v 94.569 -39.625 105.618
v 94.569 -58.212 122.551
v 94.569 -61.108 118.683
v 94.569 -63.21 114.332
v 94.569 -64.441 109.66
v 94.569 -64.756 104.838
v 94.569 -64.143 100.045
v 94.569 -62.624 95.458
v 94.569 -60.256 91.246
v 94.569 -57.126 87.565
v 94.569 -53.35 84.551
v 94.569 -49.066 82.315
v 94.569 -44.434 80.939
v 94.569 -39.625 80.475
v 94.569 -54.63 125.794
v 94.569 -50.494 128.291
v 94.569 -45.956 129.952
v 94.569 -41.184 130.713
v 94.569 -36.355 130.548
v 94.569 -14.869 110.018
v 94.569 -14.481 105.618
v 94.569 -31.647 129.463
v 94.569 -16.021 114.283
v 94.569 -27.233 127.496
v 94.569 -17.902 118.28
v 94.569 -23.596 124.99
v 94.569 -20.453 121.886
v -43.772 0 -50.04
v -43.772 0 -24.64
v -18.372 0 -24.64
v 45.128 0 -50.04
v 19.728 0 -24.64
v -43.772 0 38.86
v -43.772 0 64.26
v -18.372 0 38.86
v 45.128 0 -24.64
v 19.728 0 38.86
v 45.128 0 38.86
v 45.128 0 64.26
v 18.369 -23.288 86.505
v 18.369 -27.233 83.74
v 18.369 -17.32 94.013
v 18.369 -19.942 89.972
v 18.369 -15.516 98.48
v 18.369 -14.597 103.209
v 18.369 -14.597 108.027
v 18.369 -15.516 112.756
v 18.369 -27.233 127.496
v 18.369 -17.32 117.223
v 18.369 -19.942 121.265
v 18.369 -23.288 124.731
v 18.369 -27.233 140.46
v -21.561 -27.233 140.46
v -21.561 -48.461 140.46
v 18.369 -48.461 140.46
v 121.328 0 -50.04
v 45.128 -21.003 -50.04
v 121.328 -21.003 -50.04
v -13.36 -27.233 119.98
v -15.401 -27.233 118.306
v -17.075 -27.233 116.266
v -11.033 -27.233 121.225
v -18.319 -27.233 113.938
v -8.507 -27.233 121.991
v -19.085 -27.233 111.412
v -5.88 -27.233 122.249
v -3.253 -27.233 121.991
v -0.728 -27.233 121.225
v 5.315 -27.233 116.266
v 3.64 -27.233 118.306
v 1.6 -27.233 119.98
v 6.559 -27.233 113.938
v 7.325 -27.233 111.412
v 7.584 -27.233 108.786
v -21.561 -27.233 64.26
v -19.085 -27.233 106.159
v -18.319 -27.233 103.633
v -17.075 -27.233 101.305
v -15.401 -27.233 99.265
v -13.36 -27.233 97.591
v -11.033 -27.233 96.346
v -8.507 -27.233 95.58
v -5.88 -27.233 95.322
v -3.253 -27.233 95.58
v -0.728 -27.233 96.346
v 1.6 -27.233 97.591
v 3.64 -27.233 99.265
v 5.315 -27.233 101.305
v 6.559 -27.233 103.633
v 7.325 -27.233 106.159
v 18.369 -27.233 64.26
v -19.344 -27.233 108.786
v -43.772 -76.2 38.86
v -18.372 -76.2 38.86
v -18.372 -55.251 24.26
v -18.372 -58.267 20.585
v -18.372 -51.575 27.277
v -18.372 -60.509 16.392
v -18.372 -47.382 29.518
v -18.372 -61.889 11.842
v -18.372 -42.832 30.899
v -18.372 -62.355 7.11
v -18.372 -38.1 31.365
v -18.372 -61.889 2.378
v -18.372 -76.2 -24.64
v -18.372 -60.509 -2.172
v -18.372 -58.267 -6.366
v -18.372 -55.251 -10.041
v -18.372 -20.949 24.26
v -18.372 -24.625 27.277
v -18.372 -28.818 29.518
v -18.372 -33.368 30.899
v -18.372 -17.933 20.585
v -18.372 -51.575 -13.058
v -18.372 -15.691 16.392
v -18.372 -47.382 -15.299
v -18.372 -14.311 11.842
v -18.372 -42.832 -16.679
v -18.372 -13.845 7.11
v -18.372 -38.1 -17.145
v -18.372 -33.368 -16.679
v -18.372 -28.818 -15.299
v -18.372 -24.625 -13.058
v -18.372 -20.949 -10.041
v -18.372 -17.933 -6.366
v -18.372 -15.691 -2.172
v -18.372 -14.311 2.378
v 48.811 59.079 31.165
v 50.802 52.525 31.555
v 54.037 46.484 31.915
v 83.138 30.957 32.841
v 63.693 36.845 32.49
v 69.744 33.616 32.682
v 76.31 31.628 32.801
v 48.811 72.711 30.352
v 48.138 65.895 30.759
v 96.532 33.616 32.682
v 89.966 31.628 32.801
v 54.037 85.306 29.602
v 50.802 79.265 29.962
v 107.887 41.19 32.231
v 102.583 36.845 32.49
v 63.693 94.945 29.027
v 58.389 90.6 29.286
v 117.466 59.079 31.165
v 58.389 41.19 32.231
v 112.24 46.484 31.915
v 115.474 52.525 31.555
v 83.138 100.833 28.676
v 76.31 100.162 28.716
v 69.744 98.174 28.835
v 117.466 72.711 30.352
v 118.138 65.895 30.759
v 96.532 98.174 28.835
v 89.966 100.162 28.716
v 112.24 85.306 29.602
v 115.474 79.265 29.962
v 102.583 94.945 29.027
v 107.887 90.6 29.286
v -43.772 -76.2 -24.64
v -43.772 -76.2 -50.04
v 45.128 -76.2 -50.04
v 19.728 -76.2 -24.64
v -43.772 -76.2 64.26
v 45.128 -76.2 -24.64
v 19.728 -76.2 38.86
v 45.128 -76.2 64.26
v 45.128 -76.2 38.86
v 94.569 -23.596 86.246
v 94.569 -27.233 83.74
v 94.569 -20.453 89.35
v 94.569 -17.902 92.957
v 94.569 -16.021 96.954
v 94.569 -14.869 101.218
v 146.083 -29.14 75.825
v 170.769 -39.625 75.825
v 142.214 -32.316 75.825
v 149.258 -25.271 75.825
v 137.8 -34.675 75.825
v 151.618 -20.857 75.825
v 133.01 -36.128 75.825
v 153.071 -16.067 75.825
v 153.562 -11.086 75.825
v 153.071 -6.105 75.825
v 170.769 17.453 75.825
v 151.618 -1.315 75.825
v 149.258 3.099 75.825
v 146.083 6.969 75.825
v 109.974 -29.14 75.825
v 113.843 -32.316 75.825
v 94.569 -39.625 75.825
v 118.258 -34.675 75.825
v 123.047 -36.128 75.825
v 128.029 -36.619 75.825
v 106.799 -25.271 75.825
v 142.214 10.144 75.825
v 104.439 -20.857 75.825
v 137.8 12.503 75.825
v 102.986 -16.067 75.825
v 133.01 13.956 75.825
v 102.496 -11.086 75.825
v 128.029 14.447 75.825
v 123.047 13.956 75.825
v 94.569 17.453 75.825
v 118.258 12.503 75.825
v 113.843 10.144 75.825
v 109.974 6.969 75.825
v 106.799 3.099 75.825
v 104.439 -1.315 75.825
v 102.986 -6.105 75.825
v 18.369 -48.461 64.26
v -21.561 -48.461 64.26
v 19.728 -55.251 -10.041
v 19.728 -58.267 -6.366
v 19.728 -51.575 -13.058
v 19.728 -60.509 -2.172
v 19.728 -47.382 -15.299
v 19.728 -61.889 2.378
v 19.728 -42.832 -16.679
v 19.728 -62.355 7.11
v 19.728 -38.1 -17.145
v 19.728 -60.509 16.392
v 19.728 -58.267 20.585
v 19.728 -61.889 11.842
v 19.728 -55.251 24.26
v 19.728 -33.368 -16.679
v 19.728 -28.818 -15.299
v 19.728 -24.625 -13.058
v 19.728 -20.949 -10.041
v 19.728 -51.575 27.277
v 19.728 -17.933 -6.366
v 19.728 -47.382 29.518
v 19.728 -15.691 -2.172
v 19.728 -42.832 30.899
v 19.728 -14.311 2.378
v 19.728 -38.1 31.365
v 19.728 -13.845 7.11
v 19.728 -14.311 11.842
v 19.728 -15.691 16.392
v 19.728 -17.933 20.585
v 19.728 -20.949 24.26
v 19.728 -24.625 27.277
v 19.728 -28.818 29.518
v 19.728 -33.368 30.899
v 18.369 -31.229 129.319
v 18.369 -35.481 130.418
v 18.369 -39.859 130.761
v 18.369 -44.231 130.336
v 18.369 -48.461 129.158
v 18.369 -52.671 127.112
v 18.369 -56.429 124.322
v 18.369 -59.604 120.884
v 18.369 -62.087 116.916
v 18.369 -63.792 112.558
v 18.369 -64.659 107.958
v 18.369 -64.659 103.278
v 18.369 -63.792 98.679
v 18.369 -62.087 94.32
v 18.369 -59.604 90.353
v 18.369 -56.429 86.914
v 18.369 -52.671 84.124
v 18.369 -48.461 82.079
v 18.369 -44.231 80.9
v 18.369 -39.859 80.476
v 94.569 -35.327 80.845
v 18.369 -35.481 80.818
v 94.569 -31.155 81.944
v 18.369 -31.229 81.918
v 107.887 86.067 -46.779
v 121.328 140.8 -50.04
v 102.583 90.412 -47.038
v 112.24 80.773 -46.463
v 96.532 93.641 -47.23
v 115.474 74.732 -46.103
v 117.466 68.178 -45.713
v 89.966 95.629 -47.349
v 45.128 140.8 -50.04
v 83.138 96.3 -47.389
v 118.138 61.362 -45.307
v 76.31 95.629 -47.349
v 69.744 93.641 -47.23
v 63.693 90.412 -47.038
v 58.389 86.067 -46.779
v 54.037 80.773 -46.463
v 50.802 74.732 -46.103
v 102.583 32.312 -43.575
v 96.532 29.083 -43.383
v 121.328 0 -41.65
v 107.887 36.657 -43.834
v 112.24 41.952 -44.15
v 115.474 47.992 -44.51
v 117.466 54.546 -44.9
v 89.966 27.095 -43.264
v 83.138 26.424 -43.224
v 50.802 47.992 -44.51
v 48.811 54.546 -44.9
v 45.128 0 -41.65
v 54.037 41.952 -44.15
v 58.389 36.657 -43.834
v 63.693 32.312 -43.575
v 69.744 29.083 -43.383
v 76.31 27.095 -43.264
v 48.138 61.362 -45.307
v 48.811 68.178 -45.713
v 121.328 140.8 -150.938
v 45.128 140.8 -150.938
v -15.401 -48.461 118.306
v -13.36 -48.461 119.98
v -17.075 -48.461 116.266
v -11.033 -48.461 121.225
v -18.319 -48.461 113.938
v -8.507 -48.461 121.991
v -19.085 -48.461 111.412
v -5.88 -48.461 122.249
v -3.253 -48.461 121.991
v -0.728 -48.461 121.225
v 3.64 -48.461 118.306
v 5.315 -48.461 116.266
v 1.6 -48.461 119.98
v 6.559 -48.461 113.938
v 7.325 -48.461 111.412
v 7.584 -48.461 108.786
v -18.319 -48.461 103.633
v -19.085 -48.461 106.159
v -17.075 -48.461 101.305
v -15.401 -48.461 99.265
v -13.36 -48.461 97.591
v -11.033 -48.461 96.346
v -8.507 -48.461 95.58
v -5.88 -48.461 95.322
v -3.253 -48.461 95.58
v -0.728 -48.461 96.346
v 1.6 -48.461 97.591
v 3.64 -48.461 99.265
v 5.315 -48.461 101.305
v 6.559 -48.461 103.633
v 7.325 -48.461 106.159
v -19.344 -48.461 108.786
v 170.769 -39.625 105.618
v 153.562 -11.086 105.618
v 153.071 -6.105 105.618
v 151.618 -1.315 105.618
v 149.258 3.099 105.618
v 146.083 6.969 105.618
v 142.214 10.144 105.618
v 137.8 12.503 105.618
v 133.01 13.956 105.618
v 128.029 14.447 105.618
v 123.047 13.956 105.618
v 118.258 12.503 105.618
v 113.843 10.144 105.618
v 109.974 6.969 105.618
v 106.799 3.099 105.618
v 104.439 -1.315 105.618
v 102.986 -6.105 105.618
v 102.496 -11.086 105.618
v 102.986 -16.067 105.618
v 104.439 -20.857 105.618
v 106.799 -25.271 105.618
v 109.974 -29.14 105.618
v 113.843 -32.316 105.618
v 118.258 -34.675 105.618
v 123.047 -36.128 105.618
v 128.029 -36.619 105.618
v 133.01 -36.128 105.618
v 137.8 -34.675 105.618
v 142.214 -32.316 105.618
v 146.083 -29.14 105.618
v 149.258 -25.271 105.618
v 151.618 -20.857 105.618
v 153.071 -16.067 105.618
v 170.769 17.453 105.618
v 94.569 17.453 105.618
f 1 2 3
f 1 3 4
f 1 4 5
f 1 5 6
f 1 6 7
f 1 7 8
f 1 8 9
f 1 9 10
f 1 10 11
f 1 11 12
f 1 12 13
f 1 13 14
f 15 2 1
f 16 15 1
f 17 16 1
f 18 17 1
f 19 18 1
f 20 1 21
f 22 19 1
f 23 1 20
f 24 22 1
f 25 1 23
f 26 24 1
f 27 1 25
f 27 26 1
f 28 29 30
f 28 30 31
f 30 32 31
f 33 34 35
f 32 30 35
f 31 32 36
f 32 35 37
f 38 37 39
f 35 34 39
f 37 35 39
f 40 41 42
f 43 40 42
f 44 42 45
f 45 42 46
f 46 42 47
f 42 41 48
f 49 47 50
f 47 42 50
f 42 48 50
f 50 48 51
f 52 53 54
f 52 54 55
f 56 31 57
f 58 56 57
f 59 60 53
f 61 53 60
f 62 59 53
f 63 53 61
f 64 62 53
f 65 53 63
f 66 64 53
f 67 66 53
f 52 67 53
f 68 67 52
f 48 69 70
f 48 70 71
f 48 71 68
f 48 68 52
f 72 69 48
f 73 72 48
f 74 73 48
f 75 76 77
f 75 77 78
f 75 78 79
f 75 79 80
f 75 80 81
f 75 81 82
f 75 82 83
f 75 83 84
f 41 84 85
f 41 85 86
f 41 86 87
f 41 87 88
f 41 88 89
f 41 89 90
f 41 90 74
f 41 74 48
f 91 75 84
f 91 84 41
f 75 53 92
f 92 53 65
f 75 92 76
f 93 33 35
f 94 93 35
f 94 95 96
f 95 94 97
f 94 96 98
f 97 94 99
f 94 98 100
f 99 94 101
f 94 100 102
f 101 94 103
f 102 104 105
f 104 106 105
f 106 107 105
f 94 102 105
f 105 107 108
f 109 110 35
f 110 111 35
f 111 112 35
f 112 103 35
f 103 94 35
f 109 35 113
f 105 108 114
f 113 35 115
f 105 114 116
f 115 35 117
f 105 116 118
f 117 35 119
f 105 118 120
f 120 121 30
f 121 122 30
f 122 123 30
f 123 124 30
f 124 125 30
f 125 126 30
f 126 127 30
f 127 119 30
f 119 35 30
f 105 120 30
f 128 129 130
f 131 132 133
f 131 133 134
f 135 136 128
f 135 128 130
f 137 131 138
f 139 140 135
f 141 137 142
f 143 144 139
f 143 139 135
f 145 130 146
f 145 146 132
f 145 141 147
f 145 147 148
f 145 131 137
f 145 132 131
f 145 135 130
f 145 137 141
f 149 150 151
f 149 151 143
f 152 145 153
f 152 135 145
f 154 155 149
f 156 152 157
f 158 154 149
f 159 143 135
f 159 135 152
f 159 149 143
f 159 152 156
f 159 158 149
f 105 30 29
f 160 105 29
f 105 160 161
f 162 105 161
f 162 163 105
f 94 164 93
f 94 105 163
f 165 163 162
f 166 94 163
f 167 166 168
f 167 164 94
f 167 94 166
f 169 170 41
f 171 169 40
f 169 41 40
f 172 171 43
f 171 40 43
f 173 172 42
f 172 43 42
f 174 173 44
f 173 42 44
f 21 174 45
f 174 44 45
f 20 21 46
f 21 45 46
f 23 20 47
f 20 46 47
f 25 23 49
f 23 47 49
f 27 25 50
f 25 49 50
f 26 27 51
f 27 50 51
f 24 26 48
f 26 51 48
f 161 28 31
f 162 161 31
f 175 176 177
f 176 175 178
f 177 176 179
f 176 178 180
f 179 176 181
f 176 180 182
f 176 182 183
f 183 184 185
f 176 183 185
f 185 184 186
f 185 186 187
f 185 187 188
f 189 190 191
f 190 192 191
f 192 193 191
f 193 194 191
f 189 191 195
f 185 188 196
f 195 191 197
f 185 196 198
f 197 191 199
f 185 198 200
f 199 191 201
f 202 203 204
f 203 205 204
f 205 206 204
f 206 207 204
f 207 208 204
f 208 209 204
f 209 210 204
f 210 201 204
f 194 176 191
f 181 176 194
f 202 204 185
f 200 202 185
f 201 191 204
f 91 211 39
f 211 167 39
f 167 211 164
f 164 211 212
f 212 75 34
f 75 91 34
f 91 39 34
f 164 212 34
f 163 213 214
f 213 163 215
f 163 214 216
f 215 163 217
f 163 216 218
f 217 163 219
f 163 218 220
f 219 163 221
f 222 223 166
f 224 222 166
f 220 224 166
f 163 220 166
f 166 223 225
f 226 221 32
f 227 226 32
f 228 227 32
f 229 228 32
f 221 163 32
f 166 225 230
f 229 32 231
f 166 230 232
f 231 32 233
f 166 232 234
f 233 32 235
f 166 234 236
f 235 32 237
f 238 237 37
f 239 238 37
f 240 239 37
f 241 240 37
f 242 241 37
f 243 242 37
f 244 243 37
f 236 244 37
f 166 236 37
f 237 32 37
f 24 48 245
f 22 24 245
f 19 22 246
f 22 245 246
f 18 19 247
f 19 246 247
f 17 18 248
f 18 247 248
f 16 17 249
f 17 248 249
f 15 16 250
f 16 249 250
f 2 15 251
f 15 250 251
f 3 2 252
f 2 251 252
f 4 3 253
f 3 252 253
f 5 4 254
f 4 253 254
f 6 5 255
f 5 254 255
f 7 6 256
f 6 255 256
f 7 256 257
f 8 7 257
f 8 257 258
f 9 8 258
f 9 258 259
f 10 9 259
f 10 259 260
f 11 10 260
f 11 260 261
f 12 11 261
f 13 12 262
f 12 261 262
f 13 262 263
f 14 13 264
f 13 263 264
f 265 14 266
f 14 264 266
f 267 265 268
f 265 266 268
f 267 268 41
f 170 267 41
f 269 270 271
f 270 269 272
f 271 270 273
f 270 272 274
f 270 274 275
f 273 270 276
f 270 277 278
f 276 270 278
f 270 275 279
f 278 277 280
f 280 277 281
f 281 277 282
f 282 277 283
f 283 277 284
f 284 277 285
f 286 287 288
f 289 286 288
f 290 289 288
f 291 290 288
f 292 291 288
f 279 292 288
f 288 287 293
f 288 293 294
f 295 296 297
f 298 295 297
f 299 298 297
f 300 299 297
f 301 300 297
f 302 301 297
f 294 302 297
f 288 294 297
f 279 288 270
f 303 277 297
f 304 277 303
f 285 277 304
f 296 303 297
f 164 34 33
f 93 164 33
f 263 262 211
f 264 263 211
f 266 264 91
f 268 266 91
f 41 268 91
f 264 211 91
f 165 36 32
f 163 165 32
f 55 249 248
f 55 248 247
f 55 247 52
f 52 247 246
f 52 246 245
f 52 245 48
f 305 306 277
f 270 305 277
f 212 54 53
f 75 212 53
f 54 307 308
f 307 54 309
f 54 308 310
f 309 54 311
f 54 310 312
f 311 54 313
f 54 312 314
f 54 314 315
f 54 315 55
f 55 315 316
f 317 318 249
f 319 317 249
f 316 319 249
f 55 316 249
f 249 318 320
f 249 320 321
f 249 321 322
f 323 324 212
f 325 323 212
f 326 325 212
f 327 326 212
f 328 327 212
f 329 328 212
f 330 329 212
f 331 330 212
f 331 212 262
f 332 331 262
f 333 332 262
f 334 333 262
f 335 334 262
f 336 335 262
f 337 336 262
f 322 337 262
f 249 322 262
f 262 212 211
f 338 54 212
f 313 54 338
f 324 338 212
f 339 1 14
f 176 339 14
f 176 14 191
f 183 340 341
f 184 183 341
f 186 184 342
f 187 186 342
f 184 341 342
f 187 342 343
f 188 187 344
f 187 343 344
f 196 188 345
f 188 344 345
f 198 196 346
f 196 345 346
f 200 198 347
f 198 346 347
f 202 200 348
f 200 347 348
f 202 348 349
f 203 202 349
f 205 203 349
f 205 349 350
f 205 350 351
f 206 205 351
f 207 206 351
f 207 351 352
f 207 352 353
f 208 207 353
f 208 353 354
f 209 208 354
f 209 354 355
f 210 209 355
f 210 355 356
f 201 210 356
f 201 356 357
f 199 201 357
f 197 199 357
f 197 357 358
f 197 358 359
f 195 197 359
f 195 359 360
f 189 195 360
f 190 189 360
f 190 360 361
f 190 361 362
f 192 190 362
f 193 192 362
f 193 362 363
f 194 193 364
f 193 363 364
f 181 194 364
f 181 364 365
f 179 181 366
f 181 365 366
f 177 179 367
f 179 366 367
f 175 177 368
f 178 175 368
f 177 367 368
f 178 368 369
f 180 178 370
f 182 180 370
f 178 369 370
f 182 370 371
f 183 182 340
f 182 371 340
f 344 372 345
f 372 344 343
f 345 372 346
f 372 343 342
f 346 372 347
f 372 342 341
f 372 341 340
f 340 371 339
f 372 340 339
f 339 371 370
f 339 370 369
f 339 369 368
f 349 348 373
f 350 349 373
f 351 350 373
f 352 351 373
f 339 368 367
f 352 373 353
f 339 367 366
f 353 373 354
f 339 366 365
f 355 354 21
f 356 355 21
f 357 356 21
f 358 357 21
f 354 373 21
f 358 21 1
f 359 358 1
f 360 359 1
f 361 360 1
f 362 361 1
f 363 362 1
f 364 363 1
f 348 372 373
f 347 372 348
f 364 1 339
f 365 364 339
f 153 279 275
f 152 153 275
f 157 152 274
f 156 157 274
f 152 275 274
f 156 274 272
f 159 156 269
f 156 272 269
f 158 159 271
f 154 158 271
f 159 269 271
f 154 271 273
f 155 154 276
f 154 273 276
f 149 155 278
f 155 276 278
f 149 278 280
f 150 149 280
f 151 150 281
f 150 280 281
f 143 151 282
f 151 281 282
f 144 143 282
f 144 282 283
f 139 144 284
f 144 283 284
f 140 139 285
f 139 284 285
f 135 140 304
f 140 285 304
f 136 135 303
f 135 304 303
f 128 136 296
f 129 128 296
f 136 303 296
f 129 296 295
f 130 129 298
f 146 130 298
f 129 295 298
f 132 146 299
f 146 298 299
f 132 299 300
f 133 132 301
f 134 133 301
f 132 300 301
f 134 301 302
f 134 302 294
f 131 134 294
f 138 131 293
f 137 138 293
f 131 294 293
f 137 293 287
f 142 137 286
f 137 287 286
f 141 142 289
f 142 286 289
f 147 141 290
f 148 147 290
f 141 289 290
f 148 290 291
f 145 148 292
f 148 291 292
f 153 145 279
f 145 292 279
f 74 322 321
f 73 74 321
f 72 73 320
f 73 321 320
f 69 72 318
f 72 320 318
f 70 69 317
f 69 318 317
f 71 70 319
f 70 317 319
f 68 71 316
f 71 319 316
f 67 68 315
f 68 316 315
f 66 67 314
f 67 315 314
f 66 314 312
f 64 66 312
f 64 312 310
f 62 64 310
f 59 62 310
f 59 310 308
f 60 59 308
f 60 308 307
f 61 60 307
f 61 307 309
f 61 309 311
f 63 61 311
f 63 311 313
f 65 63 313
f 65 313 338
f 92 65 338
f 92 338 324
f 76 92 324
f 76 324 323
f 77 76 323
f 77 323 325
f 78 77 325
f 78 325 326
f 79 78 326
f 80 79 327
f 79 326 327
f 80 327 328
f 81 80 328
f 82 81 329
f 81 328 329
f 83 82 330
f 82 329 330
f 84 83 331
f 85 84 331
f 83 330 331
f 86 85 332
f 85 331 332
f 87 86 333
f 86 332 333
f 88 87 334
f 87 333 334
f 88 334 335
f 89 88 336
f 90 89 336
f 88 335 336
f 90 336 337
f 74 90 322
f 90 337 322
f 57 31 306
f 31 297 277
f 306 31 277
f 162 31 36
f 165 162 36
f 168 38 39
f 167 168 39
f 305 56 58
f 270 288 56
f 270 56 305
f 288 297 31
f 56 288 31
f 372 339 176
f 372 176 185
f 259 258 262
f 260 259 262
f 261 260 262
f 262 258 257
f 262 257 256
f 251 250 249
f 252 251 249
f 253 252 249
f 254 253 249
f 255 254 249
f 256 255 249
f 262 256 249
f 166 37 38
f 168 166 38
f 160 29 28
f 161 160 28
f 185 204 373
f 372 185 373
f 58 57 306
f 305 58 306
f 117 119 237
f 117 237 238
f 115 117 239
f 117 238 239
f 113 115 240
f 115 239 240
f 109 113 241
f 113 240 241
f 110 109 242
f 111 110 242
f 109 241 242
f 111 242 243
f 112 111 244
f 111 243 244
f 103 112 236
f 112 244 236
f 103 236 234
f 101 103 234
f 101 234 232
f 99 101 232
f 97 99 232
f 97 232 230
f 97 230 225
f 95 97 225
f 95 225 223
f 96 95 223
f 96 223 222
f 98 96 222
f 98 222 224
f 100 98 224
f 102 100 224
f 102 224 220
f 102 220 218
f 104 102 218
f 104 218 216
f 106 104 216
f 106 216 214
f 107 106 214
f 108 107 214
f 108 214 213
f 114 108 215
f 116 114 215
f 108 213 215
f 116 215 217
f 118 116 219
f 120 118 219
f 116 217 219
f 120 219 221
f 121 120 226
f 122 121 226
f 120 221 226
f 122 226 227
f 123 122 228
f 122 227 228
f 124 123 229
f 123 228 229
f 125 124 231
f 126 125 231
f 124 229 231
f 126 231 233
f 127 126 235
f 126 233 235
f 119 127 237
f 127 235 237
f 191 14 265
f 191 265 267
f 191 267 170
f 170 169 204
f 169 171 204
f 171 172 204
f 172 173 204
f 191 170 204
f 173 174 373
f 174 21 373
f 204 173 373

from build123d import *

# Parameters (mm, degrees)
F1_DEPTH  = 76.2
F2_R      = 24.255044585
F3_DEPTH  = 63.501
F4_W      = 39.929619059
F4_H      = 21.2284065783
F5_DEPTH  = 76.2
F6_R      = 13.4639441967
F7_DEPTH  = 48.4624782035
F9_DEPTH  = 76.2
F11_DEPTH = 76.2
F12_R     = 25.532860147
F13_DEPTH = 155.6596173367
F15_DEPTH = 76.2
F16_R     = 35.0001561694
F17_DEPTH = 76.2


with BuildPart() as f1:
    # F0 (on Front) → F1 (new body)
    with BuildSketch(Plane.XZ):
        Polygon((-43.7716264993, -24.640423591), (-43.7716264993, -50.040423591), (45.1283735007, -50.040423591), (45.1283735007, -24.640423591), (19.7283735007, -24.640423591), (19.7283735007, 38.859576409), (45.1283735007, 38.859576409), (45.1283735007, 64.259576409), (-43.7716264993, 64.259576409), (-43.7716264993, 38.859576409), (-18.3716264993, 38.859576409), (-18.3716264993, -24.640423591), align=None)
    extrude(amount=F1_DEPTH)

    # F2 (on face) → F3 (cut, through all)
    with BuildSketch(Plane.YZ.offset(19.7283735007)):
        with Locations((-38.1, 7.109576409)):
            Circle(F2_R)
    extrude(amount=-F3_DEPTH, mode=Mode.SUBTRACT)

    # F4 (on face) → F5 (join)
    with BuildSketch(Plane.XY.offset(64.259576409)):
        with Locations((-1.5961034223, -37.8472749144)):
            Rectangle(F4_W, F4_H)
    extrude(amount=F5_DEPTH)

    # F6 (on face) → F7 (cut, through all)
    with BuildSketch(Plane.XZ.offset(48.4614782035)):
        with Locations((-5.8800955303, 108.7855547667)):
            Circle(F6_R)
    extrude(amount=-F7_DEPTH, mode=Mode.SUBTRACT)

    # F8 (on face) → F9 (join)
    with BuildSketch(Plane.YZ.offset(18.3687061071)):
        with BuildLine():
            Line((-27.2330716252, 83.7401615654), (-27.2330716252, 127.4962259258))
            ThreePointArc((-27.2330716252, 127.4962259258), (-37.6627033578, 130.6851313451), (-48.4614782035, 129.157781457))
            Line((-48.4614782035, 129.157781457), (-48.4614782035, 82.0786060342))
            ThreePointArc((-48.4614782035, 82.0786060342), (-37.6627033578, 80.5512561461), (-27.2330716252, 83.7401615654))
        make_face()
        with BuildLine():
            ThreePointArc((-27.2330716252, 83.7401615654), (-17.9017759749, 92.9566268256), (-14.4810986247, 105.6181937456))
            ThreePointArc((-14.4810986247, 105.6181937456), (-17.9017759749, 118.2797606657), (-27.2330716252, 127.4962259258))
            Line((-27.2330716252, 127.4962259258), (-27.2330716252, 83.7401615654))
        make_face()
        with BuildLine():
            Line((-48.4614782035, 82.0786060342), (-48.4614782035, 129.157781457))
            ThreePointArc((-48.4614782035, 129.157781457), (-64.7683057461, 105.6181937456), (-48.4614782035, 82.0786060342))
        make_face()
    extrude(amount=F9_DEPTH)

    # F10 (on face) → F11 (join)
    with BuildSketch(Plane.YZ.offset(94.5687061071)):
        with BuildLine():
            Line((17.4530148506, 105.6181937456), (-14.4810986247, 105.6181937456))
            ThreePointArc((-14.4810986247, 105.6181937456), (-21.8454896042, 87.8389811644), (-39.6247021854, 80.4745901849))
            Line((-39.6247021854, 80.4745901849), (-39.6247021854, 75.824894011))
            Line((-39.6247021854, 75.824894011), (17.4530148506, 75.824894011))
            Line((17.4530148506, 75.824894011), (17.4530148506, 105.6181937456))
        make_face()
        with BuildLine():
            Line((-14.4810986247, 105.6181937456), (-39.6247021854, 105.6181937456))
            Line((-39.6247021854, 105.6181937456), (-39.6247021854, 80.4745901849))
            ThreePointArc((-39.6247021854, 80.4745901849), (-21.8454896042, 87.8389811644), (-14.4810986247, 105.6181937456))
        make_face()
    extrude(amount=F11_DEPTH)

    # F12 (on face) → F13 (cut, through all)
    with BuildSketch(Plane.XY.offset(105.6181937456)):
        with Locations((128.028690815, -11.0858436674)):
            Circle(F12_R)
    extrude(amount=-F13_DEPTH, mode=Mode.SUBTRACT)


with BuildPart() as f15:
    # F14 (on face) → F15 (new body)
    with BuildSketch(Plane.YZ.offset(45.1283735007)):
        Polygon((0, -50.040423591), (-21.0034160411, -50.040423591), (140.7995223999, -150.9381681681), (140.7995223999, -50.040423591), (0, -41.6497582876), align=None)
    extrude(amount=F15_DEPTH)

    # F16 (on face) → F17 (join)
    with BuildSketch(Plane(origin=(0, -2.4732505411, -41.5023698792), x_dir=(1, 0, 0), z_dir=(0, 0.0594874595, 0.998229053))):
        with Locations((83.1382647157, 63.9486163855)):
            Circle(F16_R)
    extrude(amount=F17_DEPTH)


solid = Compound([f1.part, f15.part])
